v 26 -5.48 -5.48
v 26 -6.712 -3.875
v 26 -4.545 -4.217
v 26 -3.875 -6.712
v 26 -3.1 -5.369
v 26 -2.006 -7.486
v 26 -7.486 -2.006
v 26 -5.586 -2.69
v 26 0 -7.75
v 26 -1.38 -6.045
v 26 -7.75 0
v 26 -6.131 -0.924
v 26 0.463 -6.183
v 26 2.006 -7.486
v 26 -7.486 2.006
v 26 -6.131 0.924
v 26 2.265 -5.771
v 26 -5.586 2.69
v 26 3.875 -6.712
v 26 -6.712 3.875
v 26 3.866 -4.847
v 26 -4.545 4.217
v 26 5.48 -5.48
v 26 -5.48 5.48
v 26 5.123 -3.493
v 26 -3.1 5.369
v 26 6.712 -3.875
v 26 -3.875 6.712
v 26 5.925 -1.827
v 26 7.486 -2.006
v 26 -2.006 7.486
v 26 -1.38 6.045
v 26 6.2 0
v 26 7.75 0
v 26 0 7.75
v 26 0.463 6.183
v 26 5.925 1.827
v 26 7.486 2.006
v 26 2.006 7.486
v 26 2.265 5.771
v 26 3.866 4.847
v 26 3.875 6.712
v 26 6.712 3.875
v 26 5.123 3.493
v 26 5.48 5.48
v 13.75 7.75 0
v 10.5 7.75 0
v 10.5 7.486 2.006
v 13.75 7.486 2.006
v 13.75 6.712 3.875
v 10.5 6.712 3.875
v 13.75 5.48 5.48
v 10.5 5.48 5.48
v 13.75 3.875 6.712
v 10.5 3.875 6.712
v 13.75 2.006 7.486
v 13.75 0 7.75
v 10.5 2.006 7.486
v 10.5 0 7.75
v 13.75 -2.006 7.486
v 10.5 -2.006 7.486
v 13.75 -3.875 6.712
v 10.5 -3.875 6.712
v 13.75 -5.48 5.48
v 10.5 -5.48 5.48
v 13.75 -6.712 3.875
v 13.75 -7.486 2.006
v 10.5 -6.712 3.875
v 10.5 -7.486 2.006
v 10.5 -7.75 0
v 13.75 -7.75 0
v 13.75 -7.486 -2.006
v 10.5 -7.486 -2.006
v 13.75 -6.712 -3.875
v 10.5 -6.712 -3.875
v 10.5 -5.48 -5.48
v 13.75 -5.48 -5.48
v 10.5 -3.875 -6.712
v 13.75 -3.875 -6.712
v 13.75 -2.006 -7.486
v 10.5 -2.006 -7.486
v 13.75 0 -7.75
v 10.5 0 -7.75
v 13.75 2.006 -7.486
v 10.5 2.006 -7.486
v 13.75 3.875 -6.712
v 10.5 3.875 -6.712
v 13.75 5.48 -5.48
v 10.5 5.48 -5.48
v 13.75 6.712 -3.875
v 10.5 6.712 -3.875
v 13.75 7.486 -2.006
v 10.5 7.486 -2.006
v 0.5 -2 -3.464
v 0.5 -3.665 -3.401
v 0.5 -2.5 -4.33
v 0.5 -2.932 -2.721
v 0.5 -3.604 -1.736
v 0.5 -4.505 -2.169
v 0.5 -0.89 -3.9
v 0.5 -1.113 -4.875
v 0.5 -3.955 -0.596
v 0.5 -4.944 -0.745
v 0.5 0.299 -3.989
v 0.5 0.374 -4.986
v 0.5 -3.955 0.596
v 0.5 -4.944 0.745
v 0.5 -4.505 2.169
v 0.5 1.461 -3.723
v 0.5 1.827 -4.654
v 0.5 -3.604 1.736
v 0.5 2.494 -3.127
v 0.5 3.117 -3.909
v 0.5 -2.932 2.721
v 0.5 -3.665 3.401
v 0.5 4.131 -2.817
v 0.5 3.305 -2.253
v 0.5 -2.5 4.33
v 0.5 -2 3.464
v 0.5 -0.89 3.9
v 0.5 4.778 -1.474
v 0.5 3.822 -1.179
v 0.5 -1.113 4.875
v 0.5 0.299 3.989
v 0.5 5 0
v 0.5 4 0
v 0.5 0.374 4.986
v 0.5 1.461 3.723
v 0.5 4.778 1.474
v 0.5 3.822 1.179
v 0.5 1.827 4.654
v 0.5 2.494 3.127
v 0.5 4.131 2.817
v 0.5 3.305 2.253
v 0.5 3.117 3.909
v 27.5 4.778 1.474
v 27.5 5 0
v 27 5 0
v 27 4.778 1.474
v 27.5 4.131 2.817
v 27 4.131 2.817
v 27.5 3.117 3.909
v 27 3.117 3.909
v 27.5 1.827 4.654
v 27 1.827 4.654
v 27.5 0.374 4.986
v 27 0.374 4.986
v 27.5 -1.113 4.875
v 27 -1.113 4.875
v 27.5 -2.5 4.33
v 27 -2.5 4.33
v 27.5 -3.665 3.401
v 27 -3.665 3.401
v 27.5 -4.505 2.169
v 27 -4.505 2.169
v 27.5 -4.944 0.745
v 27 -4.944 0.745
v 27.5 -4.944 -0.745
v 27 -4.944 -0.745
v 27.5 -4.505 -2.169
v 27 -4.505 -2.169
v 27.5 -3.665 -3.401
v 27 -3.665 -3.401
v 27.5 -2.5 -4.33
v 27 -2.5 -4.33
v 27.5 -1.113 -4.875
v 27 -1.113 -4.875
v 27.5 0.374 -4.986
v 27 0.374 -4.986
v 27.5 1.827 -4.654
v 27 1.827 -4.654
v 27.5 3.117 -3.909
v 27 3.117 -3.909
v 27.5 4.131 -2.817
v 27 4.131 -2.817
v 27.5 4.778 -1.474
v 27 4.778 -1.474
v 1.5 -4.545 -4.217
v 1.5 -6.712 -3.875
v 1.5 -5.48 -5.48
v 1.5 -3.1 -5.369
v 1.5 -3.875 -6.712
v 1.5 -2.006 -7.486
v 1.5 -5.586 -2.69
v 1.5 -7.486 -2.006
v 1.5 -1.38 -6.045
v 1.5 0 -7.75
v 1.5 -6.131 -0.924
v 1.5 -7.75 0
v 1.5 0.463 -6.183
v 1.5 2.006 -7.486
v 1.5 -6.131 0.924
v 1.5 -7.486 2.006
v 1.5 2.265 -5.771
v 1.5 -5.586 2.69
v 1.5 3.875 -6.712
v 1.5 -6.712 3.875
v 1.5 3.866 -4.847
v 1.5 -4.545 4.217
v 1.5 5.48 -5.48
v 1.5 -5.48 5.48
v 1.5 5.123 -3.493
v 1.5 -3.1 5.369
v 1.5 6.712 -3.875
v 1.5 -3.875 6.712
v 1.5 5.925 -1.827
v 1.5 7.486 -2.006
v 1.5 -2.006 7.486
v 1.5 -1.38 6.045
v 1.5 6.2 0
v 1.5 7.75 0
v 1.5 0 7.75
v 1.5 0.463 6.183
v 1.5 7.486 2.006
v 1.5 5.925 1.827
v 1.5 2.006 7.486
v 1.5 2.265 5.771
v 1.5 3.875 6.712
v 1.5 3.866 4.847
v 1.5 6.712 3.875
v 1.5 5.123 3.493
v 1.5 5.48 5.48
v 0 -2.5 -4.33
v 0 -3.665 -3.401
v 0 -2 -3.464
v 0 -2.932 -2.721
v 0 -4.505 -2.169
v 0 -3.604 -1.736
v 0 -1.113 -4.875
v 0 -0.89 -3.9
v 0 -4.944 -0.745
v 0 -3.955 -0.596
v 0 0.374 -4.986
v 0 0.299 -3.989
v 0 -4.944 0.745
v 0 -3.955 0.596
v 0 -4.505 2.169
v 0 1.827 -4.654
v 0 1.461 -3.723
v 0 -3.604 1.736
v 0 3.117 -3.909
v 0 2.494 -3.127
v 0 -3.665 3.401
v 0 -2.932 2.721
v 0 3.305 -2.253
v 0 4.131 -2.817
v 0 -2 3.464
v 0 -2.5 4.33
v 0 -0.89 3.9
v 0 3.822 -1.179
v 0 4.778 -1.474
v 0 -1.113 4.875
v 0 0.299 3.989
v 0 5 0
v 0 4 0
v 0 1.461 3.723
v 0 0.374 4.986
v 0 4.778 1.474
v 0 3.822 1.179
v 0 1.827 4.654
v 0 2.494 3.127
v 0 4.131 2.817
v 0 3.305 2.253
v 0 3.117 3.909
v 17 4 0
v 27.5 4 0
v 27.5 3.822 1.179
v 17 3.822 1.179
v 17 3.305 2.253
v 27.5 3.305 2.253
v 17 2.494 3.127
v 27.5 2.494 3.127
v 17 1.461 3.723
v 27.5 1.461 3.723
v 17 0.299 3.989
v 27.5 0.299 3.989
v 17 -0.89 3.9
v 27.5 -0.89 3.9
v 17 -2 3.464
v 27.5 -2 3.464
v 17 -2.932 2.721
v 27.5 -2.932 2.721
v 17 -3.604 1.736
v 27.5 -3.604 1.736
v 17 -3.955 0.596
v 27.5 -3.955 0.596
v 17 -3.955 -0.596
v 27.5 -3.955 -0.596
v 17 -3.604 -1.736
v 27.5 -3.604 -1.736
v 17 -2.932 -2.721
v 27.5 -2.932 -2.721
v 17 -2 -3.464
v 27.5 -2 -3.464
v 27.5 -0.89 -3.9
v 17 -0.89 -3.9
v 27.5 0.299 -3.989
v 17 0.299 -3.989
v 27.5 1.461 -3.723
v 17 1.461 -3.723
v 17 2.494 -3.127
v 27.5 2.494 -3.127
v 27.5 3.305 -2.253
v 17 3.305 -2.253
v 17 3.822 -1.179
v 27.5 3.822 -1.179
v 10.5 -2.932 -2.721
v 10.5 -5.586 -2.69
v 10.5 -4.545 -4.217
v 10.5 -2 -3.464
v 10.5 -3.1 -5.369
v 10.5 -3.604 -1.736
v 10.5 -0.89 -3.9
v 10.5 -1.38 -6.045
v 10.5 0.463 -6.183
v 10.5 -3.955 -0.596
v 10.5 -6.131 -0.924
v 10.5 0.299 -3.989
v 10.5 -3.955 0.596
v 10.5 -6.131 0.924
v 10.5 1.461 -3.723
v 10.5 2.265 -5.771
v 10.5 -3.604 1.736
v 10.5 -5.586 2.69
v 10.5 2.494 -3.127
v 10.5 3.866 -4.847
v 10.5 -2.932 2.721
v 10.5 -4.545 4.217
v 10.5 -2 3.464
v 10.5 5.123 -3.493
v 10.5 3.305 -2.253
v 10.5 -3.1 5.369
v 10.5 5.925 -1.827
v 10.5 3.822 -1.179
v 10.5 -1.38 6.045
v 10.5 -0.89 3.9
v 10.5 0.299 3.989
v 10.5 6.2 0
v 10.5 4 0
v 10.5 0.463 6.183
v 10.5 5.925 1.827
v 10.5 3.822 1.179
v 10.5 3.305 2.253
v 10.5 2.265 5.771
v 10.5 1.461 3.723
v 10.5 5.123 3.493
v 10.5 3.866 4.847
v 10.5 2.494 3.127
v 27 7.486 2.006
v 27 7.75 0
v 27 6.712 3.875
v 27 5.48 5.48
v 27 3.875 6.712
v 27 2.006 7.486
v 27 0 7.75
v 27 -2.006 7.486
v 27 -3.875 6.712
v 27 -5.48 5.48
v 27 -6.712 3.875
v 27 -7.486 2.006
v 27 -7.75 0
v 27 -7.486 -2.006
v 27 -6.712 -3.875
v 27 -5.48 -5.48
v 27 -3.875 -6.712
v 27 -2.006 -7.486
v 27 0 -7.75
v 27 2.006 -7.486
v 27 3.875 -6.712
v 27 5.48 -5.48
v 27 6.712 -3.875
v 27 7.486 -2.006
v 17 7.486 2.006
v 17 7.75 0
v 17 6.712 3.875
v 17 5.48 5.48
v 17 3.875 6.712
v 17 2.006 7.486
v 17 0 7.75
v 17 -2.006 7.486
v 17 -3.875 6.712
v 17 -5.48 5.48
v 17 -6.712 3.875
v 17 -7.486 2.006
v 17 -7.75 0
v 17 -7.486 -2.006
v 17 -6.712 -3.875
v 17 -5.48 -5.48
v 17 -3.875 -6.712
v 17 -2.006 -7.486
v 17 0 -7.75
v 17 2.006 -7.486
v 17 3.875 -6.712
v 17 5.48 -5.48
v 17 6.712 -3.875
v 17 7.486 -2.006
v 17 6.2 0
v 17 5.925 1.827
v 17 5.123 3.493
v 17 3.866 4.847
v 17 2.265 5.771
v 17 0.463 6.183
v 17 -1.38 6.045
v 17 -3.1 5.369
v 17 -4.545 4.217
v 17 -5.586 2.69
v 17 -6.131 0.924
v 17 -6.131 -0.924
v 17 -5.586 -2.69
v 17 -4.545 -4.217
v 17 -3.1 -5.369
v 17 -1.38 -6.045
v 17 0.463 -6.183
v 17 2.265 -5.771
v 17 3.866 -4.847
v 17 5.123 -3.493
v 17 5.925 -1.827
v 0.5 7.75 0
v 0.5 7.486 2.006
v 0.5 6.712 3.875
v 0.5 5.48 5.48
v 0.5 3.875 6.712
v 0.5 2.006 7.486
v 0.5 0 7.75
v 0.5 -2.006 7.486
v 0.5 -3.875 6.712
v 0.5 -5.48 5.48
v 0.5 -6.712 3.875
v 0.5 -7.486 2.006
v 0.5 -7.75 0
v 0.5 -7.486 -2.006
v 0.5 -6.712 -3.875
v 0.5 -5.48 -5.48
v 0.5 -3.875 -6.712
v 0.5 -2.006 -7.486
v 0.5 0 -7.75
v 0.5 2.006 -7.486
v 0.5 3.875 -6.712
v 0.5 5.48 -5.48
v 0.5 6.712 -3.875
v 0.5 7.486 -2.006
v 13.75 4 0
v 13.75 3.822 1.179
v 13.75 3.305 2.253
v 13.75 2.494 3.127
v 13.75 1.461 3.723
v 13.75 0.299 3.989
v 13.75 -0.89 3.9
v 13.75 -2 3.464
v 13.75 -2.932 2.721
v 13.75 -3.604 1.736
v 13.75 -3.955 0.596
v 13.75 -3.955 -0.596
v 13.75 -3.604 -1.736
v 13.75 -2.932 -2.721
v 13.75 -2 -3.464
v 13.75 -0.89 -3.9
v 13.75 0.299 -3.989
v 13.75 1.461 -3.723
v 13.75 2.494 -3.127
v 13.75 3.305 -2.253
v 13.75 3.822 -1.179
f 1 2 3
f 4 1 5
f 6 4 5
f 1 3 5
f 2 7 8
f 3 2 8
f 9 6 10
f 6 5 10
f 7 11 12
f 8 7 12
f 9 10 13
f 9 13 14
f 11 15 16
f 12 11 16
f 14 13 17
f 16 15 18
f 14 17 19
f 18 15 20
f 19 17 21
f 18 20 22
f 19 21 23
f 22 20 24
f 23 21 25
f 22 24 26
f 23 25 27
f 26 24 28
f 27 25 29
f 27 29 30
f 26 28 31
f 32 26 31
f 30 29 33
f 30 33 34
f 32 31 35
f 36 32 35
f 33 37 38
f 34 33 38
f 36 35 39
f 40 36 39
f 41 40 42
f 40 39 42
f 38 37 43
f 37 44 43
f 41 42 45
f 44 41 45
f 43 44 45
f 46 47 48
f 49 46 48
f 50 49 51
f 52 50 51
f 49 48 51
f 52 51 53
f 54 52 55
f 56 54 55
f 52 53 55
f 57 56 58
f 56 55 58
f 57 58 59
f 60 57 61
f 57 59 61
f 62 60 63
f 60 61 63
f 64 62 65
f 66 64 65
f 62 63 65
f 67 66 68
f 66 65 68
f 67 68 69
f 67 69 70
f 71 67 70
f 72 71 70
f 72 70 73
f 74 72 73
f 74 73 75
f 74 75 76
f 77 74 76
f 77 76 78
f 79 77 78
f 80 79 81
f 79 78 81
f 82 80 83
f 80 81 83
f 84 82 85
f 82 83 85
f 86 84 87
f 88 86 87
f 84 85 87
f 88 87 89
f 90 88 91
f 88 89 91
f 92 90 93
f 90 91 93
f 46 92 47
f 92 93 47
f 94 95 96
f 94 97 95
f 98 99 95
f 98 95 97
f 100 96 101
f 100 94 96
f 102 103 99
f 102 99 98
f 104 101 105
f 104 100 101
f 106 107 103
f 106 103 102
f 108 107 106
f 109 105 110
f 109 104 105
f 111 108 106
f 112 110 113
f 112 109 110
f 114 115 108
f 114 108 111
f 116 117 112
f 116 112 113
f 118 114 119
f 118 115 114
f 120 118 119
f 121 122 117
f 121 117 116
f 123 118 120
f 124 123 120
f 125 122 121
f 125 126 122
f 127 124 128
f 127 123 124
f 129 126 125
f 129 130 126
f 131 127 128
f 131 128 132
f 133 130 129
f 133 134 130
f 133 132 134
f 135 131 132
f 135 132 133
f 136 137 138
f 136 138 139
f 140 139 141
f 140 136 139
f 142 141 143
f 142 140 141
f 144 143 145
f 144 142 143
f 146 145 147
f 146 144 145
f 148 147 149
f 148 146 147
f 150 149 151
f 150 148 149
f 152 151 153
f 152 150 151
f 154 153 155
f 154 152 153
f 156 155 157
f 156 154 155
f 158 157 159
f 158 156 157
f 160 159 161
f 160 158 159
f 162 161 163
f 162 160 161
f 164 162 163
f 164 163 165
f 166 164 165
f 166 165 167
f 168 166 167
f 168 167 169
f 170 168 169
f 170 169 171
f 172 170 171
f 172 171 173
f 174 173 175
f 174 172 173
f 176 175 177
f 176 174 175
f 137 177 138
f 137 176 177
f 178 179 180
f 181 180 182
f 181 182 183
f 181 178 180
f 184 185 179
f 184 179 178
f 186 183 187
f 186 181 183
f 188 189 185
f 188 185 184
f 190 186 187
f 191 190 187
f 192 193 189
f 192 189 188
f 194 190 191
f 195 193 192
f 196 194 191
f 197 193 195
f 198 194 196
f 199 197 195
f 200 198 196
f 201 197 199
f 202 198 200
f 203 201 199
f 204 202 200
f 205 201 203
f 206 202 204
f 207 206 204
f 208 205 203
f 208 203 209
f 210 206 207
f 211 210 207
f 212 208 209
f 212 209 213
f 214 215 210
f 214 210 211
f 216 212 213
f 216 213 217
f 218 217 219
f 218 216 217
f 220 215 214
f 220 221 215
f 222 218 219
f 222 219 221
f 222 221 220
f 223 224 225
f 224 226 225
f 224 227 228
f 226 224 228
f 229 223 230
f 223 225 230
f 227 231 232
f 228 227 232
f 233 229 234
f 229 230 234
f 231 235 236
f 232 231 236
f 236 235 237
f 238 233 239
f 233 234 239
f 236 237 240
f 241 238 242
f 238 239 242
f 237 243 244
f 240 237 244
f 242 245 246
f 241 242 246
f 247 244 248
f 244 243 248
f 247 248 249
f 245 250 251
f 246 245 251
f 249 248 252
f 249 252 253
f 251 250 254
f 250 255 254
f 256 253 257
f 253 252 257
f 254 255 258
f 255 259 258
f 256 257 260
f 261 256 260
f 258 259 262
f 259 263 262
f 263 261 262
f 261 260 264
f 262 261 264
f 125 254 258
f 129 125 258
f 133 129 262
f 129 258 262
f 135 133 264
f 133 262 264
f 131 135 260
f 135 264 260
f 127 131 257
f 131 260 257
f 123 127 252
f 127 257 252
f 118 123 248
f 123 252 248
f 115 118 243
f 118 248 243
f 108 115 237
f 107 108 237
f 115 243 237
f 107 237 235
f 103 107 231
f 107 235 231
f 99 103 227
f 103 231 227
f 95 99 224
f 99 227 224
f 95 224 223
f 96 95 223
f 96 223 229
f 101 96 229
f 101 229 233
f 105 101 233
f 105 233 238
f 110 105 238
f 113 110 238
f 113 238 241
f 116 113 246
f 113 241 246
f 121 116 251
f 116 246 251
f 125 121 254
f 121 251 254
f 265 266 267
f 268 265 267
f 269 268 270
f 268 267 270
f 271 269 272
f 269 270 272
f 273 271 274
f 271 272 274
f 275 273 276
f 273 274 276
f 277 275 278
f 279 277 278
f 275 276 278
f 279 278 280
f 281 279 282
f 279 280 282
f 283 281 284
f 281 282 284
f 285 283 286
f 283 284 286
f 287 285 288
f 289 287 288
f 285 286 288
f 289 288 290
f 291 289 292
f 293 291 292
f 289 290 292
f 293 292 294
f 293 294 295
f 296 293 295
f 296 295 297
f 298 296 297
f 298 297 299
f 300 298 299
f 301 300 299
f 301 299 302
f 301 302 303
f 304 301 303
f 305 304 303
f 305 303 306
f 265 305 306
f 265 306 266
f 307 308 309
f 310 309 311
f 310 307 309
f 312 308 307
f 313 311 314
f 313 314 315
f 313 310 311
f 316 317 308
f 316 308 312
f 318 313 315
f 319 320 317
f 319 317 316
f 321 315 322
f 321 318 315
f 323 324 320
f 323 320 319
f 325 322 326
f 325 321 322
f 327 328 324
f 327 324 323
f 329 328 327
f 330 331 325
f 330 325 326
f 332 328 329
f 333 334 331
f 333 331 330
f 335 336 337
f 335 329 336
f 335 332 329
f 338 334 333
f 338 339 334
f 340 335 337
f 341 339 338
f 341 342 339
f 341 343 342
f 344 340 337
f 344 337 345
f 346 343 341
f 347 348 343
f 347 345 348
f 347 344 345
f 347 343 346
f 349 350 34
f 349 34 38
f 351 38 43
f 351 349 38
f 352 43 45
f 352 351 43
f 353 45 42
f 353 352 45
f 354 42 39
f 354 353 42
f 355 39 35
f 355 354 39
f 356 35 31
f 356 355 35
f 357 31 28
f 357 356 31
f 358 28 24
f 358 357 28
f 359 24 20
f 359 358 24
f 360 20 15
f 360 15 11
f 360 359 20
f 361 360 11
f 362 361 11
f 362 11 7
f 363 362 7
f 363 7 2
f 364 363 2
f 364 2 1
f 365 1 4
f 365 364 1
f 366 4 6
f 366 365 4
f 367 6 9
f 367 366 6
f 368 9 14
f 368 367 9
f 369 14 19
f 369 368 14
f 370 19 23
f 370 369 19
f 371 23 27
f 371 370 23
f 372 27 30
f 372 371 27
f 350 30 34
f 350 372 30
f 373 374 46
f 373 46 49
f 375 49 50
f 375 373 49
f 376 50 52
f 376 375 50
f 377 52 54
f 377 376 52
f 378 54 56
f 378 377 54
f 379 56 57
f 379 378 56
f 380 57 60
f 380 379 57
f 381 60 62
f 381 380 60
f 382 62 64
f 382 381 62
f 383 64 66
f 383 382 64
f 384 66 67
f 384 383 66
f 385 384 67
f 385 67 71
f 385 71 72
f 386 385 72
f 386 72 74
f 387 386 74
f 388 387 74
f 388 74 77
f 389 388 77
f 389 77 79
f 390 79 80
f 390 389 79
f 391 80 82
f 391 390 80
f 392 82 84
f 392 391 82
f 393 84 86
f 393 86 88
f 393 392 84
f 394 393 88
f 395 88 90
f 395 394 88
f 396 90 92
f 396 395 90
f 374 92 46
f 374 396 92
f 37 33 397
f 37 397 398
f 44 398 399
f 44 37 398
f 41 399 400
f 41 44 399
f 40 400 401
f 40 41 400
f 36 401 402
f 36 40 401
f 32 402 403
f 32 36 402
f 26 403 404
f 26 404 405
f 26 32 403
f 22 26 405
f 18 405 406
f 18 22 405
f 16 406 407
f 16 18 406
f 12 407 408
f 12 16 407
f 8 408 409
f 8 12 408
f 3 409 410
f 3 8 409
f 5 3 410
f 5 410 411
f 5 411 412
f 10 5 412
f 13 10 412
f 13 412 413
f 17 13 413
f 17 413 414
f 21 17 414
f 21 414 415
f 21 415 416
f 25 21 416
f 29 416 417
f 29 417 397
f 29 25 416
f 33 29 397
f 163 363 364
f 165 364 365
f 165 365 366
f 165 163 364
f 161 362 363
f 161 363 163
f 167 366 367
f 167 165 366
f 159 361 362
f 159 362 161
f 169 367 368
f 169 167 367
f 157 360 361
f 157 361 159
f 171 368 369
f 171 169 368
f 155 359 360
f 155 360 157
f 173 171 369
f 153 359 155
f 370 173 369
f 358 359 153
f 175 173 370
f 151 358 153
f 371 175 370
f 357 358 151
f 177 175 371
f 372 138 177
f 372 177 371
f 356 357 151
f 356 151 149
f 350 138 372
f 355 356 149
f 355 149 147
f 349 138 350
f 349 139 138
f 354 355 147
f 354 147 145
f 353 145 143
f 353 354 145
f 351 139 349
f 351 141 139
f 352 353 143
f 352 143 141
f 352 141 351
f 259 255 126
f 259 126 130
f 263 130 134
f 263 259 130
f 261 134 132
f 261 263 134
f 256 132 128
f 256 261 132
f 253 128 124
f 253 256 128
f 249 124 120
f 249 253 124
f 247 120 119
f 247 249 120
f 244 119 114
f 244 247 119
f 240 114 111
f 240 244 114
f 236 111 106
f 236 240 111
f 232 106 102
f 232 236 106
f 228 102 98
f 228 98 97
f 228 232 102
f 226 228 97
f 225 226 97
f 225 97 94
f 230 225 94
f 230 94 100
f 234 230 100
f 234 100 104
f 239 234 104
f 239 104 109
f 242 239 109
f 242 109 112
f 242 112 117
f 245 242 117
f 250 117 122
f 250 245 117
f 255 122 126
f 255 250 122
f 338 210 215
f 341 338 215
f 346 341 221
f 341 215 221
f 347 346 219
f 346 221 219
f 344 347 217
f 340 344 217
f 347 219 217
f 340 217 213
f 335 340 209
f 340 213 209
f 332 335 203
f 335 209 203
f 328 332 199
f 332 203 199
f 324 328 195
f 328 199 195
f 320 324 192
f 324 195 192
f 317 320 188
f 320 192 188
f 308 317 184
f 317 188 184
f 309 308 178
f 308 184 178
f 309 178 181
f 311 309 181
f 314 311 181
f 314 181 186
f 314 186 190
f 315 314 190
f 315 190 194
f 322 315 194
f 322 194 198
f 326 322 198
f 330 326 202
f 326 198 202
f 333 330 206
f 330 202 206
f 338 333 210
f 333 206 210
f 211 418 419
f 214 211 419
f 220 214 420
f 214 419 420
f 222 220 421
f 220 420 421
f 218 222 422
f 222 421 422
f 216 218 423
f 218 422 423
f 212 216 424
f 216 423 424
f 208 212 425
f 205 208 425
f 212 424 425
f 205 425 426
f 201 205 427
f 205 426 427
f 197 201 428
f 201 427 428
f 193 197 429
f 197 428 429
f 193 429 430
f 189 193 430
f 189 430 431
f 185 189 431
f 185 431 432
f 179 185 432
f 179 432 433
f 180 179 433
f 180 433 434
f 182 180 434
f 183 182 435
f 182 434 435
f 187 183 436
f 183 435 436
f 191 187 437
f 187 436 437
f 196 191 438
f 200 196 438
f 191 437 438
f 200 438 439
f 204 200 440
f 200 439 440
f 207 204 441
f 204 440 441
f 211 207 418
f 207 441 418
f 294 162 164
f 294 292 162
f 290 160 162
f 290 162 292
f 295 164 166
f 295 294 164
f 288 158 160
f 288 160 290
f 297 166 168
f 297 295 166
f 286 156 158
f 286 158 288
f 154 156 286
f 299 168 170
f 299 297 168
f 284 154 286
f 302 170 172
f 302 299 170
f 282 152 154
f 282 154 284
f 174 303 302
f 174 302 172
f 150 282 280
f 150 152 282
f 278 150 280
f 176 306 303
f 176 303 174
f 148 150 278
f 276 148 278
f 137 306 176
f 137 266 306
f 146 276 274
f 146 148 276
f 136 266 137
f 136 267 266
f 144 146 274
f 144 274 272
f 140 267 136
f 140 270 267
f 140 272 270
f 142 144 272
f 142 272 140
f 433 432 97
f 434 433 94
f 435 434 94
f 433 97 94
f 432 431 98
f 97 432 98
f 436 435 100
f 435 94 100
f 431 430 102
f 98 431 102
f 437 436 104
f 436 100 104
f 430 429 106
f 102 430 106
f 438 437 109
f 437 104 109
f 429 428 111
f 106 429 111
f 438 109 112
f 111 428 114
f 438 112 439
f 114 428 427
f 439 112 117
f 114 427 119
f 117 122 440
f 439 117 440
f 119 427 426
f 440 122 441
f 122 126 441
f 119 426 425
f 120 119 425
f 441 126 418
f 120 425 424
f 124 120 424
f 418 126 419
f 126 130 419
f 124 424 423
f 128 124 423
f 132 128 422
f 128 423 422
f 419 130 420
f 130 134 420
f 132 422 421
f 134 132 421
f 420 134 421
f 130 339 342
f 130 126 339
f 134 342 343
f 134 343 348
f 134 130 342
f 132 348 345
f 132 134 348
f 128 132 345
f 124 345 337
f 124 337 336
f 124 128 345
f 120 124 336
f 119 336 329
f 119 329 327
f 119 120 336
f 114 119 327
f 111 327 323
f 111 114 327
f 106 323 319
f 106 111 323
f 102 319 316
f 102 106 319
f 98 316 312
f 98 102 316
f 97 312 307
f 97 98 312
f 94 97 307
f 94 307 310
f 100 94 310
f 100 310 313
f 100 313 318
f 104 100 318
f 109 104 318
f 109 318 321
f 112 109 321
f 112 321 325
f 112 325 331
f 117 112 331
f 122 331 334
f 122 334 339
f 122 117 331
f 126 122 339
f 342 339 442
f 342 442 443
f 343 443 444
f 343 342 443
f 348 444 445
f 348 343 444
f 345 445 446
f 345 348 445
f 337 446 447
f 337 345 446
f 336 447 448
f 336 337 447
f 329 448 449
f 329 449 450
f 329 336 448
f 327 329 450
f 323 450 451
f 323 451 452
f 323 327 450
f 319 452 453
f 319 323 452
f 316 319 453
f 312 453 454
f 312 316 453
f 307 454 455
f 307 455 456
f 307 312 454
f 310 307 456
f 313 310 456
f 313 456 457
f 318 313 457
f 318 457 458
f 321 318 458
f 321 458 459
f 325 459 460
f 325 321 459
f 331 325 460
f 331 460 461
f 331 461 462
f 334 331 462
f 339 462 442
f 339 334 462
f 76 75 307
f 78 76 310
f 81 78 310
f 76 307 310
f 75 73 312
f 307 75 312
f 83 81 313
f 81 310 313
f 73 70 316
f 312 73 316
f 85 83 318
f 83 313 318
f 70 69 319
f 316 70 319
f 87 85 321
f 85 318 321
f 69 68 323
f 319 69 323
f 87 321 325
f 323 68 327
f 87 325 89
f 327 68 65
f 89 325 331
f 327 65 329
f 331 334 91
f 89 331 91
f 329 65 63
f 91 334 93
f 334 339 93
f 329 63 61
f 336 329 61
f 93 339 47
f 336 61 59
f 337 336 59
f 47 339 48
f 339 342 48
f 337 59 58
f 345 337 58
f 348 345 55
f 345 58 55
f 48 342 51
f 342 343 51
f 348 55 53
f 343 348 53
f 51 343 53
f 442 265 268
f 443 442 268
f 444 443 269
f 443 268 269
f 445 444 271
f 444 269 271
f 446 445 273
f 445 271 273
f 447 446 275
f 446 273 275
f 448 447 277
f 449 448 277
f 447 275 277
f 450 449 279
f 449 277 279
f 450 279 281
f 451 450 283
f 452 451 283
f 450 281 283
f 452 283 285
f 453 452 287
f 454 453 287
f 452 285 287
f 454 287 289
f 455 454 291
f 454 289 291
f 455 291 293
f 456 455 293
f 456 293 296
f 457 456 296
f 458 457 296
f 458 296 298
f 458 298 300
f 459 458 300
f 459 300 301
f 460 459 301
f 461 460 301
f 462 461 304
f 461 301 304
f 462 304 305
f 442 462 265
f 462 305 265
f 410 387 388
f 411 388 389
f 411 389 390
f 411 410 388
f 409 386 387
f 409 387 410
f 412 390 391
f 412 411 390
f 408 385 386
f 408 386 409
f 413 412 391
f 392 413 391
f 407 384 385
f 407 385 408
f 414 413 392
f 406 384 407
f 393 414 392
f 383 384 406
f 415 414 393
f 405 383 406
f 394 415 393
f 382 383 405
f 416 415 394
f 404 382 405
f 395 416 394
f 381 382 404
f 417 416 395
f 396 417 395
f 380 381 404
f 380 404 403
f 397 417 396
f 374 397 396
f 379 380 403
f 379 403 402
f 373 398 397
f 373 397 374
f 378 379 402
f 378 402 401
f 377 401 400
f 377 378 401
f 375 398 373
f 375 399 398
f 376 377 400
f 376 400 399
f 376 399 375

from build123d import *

# Parameters (mm, degrees)
F0_R     = 5
F0_R_2   = 4
F1_DEPTH = 0.5
F2_R     = 7.75
F2_R_2   = 5
F2_R_3   = 4
F3_DEPTH = 1
F4_R     = 6.2
F4_R_2   = 4
F5_DEPTH = 9
F6_R     = 7.75
F6_R_2   = 4
F7_DEPTH = 3.25


with BuildPart() as f1:
    # F0 (on Right) → F1 (new body)
    with BuildSketch(Plane.YZ):
        Circle(F0_R)
        Circle(F0_R_2, mode=Mode.SUBTRACT)
    extrude(amount=F1_DEPTH)


with BuildPart() as f3:
    # F2 (on face) → F3 (new body)
    with BuildSketch(Plane.YZ.offset(0.5)):
        Circle(F2_R)
        Circle(F2_R_2, mode=Mode.SUBTRACT)
        Circle(F2_R_2)
        Circle(F2_R_3, mode=Mode.SUBTRACT)
    extrude(amount=F3_DEPTH)

    # F4 (on face) → F5 (join)
    with BuildSketch(Plane.YZ.offset(1.5)):
        Circle(F4_R)
        Circle(F4_R_2, mode=Mode.SUBTRACT)
    extrude(amount=F5_DEPTH)


with BuildPart() as f7:
    # F6 (on face) → F7 (new body)
    with BuildSketch(Plane.YZ.offset(10.5)):
        Circle(F6_R)
        Circle(F6_R_2, mode=Mode.SUBTRACT)
    extrude(amount=F7_DEPTH)



with BuildPart() as f7_1:
    add(f7.part)
    # F8: F3, F1, F7 across face
    add(f3.part.mirror(Plane.YZ.offset(13.75)))
    add(f1.part.mirror(Plane.YZ.offset(13.75)))
    add(f7.part.mirror(Plane.YZ.offset(13.75)))


solid = Compound([f1.part, f3.part, f7_1.part])
